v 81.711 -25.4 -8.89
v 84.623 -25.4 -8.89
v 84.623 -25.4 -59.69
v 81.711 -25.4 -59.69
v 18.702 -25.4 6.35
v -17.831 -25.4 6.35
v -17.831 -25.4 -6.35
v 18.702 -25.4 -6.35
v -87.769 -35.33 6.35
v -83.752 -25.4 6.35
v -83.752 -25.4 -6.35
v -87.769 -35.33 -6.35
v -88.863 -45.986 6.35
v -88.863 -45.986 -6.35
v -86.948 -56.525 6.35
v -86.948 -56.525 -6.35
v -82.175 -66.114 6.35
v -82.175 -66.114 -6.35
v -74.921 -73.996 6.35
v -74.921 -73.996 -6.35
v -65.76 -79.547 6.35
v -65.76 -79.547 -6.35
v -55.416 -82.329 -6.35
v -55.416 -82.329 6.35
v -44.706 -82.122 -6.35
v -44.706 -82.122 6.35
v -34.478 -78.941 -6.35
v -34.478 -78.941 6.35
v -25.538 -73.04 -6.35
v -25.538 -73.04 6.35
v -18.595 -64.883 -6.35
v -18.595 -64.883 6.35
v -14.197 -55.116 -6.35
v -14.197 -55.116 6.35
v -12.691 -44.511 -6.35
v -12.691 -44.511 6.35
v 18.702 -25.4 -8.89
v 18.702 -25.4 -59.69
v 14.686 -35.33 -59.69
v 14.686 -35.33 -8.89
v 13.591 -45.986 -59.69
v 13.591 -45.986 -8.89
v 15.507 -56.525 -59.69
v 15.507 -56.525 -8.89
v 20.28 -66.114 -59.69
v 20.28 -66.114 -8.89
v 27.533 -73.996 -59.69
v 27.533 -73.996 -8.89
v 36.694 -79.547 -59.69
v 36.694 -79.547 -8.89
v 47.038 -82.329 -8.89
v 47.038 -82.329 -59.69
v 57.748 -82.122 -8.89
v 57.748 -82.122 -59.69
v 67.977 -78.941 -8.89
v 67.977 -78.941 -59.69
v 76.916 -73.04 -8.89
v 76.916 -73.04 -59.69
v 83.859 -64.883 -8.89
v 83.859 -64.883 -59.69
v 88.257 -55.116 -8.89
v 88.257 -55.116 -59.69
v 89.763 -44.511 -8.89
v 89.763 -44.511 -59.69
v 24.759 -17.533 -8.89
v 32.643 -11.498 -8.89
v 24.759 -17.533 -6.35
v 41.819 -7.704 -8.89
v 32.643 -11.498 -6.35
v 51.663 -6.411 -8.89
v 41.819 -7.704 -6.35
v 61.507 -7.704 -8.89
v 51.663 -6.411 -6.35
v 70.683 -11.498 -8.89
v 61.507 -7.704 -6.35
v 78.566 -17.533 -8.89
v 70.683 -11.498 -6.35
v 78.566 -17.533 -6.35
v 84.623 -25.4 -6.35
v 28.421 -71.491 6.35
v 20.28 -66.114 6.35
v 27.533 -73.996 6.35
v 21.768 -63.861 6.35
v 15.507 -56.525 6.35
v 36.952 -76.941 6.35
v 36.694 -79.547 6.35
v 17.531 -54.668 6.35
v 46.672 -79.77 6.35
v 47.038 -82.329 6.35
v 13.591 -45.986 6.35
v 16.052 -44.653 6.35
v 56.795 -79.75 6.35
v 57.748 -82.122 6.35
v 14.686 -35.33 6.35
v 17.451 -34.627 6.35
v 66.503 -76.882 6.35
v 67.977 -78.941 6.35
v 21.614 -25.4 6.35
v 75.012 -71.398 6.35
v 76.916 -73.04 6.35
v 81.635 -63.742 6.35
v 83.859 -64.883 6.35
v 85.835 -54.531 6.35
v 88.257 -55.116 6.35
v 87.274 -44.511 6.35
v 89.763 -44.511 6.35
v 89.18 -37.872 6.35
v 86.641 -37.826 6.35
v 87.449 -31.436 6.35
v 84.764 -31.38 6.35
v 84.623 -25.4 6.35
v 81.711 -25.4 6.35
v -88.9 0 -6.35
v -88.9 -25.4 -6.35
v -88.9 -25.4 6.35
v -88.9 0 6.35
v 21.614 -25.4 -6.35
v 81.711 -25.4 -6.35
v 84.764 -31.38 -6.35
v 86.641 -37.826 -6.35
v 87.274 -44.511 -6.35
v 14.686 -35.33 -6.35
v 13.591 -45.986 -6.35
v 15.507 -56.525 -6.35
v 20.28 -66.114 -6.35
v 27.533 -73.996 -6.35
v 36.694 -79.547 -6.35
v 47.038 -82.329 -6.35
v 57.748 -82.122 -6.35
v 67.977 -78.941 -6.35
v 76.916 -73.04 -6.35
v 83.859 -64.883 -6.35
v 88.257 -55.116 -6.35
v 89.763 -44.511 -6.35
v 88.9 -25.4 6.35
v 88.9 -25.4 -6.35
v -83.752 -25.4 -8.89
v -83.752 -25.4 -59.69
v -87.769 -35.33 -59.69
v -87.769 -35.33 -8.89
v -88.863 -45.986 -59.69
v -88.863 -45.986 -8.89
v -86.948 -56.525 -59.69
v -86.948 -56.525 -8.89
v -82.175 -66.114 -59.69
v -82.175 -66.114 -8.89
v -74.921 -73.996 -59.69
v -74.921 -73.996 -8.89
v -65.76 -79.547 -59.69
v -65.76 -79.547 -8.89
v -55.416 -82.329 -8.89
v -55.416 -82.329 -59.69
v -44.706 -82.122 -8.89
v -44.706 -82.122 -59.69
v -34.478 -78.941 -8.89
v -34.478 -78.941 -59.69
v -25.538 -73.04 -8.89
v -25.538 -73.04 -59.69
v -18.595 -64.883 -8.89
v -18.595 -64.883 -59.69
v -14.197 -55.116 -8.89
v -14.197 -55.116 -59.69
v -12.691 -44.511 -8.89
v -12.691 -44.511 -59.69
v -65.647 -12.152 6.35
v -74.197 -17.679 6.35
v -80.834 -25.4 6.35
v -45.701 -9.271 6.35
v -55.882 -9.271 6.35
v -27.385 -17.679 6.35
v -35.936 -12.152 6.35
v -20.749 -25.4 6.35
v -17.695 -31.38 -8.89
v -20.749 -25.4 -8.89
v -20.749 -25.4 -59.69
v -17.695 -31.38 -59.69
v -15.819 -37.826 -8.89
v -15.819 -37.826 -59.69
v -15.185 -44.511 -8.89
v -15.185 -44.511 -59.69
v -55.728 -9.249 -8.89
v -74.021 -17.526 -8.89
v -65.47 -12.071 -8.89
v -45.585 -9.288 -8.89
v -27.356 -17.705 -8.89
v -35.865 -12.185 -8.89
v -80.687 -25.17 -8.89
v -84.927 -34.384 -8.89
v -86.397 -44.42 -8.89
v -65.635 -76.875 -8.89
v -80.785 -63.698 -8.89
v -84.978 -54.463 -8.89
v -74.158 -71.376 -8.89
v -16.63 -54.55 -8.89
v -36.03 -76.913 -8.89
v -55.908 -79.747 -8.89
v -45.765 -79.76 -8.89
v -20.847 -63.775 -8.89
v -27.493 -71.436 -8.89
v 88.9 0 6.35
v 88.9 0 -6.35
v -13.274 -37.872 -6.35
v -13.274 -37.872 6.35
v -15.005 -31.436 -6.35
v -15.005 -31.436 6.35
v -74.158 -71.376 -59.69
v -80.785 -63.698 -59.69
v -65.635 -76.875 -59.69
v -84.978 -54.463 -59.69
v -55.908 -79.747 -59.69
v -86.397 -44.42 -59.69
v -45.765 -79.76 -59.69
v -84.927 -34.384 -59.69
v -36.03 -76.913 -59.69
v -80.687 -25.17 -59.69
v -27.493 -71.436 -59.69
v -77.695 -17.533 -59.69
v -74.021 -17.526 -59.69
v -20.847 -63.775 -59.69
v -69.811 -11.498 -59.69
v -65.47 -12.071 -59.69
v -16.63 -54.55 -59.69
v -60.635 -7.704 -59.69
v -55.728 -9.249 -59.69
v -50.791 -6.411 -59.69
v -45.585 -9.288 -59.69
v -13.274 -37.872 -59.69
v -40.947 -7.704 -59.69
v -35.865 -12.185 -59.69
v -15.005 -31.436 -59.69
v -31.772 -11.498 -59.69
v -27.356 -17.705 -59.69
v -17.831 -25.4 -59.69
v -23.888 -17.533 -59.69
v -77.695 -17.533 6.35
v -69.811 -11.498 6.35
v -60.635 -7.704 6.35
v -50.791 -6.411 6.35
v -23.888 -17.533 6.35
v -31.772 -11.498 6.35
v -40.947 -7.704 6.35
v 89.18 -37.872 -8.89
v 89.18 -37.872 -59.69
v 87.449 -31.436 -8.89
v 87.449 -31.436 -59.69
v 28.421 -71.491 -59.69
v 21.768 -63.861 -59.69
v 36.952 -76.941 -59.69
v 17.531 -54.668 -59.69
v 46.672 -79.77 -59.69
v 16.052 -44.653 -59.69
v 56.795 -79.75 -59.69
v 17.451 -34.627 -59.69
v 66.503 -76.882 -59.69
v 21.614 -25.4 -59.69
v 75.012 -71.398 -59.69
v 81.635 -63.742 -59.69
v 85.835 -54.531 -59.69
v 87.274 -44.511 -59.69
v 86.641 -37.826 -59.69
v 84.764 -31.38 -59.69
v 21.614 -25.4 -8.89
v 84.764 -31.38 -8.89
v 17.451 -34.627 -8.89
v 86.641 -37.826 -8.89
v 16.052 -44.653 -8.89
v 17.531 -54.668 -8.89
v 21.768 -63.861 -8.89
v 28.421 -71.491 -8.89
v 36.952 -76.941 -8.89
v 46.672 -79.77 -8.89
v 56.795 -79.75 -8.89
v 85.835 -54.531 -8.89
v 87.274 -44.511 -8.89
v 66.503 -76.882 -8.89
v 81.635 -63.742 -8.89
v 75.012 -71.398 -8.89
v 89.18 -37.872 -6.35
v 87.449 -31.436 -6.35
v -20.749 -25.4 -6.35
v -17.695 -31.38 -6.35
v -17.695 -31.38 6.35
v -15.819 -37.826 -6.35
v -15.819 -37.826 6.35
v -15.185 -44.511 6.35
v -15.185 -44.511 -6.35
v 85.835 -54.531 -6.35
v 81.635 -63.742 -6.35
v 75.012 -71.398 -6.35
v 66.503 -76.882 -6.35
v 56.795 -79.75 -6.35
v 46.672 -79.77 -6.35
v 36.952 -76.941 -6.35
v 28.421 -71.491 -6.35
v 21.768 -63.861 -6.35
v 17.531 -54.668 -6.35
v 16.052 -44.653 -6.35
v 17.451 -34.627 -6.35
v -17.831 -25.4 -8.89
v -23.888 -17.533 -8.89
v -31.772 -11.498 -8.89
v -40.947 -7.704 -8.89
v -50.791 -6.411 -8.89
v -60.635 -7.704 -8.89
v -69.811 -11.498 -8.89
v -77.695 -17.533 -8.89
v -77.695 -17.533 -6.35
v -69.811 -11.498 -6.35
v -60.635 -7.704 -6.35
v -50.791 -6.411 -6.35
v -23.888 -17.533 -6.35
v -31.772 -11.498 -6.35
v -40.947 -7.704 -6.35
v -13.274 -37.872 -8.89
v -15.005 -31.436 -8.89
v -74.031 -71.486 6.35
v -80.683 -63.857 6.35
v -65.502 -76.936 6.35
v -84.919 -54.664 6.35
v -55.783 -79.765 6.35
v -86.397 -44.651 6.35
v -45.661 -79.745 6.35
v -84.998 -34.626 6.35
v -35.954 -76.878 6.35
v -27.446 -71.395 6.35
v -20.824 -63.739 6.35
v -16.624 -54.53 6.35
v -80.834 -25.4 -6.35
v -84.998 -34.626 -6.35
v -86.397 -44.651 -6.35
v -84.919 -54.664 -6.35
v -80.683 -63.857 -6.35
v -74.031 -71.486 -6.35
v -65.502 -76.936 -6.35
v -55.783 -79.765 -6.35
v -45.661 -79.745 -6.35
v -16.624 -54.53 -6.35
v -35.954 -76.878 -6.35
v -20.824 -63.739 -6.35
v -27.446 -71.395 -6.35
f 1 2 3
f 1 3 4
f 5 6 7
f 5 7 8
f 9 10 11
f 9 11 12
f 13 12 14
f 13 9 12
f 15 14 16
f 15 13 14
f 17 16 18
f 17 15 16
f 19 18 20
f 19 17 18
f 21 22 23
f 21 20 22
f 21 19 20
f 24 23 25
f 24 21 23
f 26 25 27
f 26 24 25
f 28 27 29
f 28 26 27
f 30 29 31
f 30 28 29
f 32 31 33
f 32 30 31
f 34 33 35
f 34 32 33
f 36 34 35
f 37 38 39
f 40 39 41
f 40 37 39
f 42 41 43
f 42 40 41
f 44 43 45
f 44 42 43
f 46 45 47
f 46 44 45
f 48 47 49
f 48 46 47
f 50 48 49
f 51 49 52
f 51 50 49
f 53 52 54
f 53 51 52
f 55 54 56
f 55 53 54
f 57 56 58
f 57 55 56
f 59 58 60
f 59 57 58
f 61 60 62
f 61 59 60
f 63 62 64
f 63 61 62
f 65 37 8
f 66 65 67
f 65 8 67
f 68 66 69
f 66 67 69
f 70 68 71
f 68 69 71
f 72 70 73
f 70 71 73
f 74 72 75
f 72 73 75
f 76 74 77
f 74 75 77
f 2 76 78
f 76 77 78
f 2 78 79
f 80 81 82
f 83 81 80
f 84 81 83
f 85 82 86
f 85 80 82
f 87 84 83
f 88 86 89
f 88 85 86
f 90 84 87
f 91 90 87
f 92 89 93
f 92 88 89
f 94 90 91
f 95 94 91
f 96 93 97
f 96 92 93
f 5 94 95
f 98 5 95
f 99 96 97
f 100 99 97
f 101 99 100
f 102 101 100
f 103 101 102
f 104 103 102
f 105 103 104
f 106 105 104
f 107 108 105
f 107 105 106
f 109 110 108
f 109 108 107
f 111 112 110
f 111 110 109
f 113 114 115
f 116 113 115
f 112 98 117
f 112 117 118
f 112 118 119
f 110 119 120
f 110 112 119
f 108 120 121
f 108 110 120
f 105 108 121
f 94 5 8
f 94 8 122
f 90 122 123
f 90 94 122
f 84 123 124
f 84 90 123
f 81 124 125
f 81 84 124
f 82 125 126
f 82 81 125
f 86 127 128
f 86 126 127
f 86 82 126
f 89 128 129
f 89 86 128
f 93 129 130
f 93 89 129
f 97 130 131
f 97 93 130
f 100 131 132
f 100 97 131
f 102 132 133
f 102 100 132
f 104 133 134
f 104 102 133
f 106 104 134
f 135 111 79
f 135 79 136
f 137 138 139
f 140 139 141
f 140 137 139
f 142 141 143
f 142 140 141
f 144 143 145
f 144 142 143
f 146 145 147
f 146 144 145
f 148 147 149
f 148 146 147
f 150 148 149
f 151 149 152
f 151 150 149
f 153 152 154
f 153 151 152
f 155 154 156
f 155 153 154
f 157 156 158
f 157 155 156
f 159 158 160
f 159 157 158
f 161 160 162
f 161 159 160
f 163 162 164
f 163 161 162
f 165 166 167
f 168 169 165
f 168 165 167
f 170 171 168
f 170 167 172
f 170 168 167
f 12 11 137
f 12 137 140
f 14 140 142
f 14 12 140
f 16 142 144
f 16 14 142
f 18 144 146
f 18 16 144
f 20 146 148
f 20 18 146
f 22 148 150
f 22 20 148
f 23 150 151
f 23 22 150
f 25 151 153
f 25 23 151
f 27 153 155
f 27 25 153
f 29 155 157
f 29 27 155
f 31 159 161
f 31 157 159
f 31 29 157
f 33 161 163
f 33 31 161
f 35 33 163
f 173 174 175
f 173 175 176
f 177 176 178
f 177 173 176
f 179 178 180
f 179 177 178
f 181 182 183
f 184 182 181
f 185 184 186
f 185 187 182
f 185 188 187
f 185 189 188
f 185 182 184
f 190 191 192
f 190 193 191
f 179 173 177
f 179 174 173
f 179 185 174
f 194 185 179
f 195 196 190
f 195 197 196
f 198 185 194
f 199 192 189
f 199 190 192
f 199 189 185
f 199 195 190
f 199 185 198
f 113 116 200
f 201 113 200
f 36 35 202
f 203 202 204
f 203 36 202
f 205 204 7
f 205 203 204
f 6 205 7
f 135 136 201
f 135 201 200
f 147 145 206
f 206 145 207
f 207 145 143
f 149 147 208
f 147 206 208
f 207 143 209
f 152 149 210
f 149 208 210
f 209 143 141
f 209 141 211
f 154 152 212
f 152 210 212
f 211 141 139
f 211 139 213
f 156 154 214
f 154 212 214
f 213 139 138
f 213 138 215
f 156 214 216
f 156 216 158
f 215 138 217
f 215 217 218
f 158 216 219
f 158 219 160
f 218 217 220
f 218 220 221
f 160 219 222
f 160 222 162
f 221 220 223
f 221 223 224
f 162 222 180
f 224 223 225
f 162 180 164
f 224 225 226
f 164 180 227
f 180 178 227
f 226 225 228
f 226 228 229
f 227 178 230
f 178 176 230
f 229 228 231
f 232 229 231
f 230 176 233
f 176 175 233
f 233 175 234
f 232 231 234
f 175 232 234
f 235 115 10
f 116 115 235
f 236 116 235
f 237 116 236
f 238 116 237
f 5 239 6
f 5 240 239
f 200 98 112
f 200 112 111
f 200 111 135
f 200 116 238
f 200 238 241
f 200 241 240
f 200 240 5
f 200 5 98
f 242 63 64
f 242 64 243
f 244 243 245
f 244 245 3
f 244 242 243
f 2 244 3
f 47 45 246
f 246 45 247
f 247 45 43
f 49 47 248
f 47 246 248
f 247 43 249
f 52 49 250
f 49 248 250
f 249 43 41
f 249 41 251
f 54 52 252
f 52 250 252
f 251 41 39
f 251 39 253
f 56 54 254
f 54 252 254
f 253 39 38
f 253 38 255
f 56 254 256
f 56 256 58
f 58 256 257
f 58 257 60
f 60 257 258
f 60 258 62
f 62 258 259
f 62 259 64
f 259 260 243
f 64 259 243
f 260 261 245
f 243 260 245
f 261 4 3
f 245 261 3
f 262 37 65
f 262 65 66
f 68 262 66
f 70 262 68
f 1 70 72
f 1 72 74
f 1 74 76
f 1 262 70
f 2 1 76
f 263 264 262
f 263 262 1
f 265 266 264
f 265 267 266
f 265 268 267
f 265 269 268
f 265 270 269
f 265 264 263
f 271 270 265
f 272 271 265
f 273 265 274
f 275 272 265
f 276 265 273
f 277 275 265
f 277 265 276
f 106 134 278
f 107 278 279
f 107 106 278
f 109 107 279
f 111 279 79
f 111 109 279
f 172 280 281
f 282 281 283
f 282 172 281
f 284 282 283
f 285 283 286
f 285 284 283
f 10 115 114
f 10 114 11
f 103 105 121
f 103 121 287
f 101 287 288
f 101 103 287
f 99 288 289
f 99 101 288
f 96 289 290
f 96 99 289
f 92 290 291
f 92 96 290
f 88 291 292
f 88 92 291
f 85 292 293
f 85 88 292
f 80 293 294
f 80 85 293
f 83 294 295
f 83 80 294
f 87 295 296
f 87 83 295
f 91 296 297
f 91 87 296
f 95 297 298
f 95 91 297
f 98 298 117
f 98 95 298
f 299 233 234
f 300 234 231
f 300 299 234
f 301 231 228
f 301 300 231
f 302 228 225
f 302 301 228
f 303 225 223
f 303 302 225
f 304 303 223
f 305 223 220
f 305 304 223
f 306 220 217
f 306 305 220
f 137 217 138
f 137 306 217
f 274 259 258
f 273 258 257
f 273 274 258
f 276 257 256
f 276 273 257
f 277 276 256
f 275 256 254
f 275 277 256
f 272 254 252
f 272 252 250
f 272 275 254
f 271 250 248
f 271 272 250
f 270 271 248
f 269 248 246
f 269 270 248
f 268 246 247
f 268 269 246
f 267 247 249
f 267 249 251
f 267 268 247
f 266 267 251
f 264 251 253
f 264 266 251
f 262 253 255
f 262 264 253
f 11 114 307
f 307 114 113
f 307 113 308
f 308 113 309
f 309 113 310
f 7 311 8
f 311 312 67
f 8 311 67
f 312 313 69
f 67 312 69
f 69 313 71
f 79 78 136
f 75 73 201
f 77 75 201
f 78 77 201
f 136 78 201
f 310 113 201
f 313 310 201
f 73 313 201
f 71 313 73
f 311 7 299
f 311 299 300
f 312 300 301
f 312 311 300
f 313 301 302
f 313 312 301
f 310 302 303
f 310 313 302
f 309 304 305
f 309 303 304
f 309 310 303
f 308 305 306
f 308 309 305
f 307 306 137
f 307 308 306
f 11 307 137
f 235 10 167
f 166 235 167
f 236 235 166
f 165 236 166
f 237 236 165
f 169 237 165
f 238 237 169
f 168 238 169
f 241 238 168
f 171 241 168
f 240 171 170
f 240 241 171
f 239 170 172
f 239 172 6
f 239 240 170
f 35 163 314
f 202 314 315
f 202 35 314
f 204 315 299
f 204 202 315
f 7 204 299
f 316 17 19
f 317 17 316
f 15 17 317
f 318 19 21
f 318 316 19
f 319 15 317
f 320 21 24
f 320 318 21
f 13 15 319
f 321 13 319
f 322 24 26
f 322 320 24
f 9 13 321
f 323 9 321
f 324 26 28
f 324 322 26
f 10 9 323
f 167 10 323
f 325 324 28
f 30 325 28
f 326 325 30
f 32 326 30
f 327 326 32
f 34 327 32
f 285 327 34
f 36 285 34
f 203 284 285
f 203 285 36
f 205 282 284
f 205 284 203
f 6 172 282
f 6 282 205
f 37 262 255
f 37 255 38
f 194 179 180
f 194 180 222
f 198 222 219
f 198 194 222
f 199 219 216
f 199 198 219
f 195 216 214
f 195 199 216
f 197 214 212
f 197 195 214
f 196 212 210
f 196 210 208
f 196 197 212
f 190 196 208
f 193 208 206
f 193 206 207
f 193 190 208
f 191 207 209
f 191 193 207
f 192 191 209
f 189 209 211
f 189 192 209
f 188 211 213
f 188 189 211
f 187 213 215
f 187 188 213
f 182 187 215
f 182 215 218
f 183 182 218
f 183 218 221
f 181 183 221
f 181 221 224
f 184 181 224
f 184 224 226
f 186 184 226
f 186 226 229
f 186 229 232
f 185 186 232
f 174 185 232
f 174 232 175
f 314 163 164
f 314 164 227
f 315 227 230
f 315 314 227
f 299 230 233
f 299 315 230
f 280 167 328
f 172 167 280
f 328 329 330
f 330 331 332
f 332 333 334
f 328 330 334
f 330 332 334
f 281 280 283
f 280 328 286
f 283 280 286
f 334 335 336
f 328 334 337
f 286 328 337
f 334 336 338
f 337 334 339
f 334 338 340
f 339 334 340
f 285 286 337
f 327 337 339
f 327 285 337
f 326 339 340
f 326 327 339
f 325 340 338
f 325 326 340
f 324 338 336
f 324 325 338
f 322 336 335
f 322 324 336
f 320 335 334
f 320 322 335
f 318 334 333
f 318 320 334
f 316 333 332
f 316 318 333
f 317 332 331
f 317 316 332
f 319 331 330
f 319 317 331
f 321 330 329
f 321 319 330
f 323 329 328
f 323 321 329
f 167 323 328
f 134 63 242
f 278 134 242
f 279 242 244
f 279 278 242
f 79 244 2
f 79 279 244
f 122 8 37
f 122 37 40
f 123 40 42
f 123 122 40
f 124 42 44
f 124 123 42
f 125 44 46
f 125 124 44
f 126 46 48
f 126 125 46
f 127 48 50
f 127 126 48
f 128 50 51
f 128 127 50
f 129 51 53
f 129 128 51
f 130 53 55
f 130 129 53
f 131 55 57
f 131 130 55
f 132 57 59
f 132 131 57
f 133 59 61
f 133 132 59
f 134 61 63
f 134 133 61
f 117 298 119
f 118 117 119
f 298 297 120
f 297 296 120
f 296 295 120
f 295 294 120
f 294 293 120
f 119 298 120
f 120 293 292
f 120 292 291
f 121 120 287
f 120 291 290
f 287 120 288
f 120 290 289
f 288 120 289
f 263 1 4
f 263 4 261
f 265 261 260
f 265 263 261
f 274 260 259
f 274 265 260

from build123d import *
from build123d import SkipClean  # not in build123d's __all__

# Parameters (mm, degrees)
F0_W     = 177.8
F0_H     = 12.7
F1_DEPTH = 25.4
F3_DEPTH = 66.04
F4_R     = 38.1
F5_DEPTH = 2.54


with BuildPart() as f1:
    # F0 (on Front) → F1 (new body)
    with BuildSketch(Plane.XZ):
        Rectangle(F0_W, F0_H)
    extrude(amount=F1_DEPTH)



with BuildPart() as f3:
    # F2 (on face) → F3 (new body)
    with BuildSketch(Plane.XY.offset(6.35)):
        with BuildLine():
            ThreePointArc((-83.7517897457, -25.4), (-60.6861906119, -81.3033672223), (-12.6913306355, -44.5106811821))
            ThreePointArc((-12.6913306355, -44.5106811821), (-13.9986445954, -34.6158212058), (-17.8308715254, -25.4))
            Line((-17.8308715254, -25.4), (-20.7487240634, -25.4))
            ThreePointArc((-20.7487240634, -25.4), (-16.6045729668, -34.558699219), (-15.1854835751, -44.5106811821))
            ThreePointArc((-15.1854835751, -44.5106811821), (-60.7433125987, -78.6974388509), (-80.8339372077, -25.4))
            Line((-80.8339372077, -25.4), (-83.7517897457, -25.4))
        make_face()
        with BuildLine():
            Line((-20.7487240634, -25.4), (-17.8308715254, -25.4))
            ThreePointArc((-17.8308715254, -25.4), (-50.7913306355, -6.4106811821), (-83.7517897457, -25.4))
            Line((-83.7517897457, -25.4), (-80.8339372077, -25.4))
            ThreePointArc((-80.8339372077, -25.4), (-50.7913306355, -8.9048341217), (-20.7487240634, -25.4))
        make_face()
    extrude(amount=-F3_DEPTH)


with BuildPart() as f3b:
    # F2 (on face) → F3, piece 2 (new body)
    with BuildSketch(Plane.XY.offset(6.35)):
        with BuildLine():
            Line((21.6144230301, -25.4), (18.7024404436, -25.4))
            ThreePointArc((18.7024404436, -25.4), (41.7680395775, -81.3033672223), (89.7628995538, -44.5106811821))
            ThreePointArc((89.7628995538, -44.5106811821), (88.4555855939, -34.6158212058), (84.623358664, -25.4))
            Line((84.623358664, -25.4), (81.7113760775, -25.4))
            ThreePointArc((81.7113760775, -25.4), (85.8548530255, -34.5588273636), (87.2736995538, -44.5106811821))
            ThreePointArc((87.2736995538, -44.5106811821), (41.7110457353, -78.7026346539), (21.6144230301, -25.4))
        make_face()
    extrude(amount=-F3_DEPTH)


with BuildPart() as f1_1:
    add(f1.part, clean=False)

    with SkipClean():  # cleaning this boolean's faces spoils the solid; the shape is the same uncleaned
        add(f3.part)  # F5 merges F3

    with SkipClean():  # cleaning this boolean's faces spoils the solid; the shape is the same uncleaned
        add(f3b.part)  # F5 merges F3b
    # F4 (on face) → F5 (join)
    with BuildSketch(Plane(origin=(0, 0, -6.35), x_dir=(1, 0, 0), z_dir=(0, 0, -1))):
        with Locations((-50.7913306355, 44.5106811821)):
            Circle(F4_R)
        with Locations((51.6628995538, 44.5106811821)):
            Circle(F4_R)
    with SkipClean():  # cleaning this boolean's faces spoils the solid; the shape is the same uncleaned
        extrude(amount=F5_DEPTH)


solid = f1_1.part
